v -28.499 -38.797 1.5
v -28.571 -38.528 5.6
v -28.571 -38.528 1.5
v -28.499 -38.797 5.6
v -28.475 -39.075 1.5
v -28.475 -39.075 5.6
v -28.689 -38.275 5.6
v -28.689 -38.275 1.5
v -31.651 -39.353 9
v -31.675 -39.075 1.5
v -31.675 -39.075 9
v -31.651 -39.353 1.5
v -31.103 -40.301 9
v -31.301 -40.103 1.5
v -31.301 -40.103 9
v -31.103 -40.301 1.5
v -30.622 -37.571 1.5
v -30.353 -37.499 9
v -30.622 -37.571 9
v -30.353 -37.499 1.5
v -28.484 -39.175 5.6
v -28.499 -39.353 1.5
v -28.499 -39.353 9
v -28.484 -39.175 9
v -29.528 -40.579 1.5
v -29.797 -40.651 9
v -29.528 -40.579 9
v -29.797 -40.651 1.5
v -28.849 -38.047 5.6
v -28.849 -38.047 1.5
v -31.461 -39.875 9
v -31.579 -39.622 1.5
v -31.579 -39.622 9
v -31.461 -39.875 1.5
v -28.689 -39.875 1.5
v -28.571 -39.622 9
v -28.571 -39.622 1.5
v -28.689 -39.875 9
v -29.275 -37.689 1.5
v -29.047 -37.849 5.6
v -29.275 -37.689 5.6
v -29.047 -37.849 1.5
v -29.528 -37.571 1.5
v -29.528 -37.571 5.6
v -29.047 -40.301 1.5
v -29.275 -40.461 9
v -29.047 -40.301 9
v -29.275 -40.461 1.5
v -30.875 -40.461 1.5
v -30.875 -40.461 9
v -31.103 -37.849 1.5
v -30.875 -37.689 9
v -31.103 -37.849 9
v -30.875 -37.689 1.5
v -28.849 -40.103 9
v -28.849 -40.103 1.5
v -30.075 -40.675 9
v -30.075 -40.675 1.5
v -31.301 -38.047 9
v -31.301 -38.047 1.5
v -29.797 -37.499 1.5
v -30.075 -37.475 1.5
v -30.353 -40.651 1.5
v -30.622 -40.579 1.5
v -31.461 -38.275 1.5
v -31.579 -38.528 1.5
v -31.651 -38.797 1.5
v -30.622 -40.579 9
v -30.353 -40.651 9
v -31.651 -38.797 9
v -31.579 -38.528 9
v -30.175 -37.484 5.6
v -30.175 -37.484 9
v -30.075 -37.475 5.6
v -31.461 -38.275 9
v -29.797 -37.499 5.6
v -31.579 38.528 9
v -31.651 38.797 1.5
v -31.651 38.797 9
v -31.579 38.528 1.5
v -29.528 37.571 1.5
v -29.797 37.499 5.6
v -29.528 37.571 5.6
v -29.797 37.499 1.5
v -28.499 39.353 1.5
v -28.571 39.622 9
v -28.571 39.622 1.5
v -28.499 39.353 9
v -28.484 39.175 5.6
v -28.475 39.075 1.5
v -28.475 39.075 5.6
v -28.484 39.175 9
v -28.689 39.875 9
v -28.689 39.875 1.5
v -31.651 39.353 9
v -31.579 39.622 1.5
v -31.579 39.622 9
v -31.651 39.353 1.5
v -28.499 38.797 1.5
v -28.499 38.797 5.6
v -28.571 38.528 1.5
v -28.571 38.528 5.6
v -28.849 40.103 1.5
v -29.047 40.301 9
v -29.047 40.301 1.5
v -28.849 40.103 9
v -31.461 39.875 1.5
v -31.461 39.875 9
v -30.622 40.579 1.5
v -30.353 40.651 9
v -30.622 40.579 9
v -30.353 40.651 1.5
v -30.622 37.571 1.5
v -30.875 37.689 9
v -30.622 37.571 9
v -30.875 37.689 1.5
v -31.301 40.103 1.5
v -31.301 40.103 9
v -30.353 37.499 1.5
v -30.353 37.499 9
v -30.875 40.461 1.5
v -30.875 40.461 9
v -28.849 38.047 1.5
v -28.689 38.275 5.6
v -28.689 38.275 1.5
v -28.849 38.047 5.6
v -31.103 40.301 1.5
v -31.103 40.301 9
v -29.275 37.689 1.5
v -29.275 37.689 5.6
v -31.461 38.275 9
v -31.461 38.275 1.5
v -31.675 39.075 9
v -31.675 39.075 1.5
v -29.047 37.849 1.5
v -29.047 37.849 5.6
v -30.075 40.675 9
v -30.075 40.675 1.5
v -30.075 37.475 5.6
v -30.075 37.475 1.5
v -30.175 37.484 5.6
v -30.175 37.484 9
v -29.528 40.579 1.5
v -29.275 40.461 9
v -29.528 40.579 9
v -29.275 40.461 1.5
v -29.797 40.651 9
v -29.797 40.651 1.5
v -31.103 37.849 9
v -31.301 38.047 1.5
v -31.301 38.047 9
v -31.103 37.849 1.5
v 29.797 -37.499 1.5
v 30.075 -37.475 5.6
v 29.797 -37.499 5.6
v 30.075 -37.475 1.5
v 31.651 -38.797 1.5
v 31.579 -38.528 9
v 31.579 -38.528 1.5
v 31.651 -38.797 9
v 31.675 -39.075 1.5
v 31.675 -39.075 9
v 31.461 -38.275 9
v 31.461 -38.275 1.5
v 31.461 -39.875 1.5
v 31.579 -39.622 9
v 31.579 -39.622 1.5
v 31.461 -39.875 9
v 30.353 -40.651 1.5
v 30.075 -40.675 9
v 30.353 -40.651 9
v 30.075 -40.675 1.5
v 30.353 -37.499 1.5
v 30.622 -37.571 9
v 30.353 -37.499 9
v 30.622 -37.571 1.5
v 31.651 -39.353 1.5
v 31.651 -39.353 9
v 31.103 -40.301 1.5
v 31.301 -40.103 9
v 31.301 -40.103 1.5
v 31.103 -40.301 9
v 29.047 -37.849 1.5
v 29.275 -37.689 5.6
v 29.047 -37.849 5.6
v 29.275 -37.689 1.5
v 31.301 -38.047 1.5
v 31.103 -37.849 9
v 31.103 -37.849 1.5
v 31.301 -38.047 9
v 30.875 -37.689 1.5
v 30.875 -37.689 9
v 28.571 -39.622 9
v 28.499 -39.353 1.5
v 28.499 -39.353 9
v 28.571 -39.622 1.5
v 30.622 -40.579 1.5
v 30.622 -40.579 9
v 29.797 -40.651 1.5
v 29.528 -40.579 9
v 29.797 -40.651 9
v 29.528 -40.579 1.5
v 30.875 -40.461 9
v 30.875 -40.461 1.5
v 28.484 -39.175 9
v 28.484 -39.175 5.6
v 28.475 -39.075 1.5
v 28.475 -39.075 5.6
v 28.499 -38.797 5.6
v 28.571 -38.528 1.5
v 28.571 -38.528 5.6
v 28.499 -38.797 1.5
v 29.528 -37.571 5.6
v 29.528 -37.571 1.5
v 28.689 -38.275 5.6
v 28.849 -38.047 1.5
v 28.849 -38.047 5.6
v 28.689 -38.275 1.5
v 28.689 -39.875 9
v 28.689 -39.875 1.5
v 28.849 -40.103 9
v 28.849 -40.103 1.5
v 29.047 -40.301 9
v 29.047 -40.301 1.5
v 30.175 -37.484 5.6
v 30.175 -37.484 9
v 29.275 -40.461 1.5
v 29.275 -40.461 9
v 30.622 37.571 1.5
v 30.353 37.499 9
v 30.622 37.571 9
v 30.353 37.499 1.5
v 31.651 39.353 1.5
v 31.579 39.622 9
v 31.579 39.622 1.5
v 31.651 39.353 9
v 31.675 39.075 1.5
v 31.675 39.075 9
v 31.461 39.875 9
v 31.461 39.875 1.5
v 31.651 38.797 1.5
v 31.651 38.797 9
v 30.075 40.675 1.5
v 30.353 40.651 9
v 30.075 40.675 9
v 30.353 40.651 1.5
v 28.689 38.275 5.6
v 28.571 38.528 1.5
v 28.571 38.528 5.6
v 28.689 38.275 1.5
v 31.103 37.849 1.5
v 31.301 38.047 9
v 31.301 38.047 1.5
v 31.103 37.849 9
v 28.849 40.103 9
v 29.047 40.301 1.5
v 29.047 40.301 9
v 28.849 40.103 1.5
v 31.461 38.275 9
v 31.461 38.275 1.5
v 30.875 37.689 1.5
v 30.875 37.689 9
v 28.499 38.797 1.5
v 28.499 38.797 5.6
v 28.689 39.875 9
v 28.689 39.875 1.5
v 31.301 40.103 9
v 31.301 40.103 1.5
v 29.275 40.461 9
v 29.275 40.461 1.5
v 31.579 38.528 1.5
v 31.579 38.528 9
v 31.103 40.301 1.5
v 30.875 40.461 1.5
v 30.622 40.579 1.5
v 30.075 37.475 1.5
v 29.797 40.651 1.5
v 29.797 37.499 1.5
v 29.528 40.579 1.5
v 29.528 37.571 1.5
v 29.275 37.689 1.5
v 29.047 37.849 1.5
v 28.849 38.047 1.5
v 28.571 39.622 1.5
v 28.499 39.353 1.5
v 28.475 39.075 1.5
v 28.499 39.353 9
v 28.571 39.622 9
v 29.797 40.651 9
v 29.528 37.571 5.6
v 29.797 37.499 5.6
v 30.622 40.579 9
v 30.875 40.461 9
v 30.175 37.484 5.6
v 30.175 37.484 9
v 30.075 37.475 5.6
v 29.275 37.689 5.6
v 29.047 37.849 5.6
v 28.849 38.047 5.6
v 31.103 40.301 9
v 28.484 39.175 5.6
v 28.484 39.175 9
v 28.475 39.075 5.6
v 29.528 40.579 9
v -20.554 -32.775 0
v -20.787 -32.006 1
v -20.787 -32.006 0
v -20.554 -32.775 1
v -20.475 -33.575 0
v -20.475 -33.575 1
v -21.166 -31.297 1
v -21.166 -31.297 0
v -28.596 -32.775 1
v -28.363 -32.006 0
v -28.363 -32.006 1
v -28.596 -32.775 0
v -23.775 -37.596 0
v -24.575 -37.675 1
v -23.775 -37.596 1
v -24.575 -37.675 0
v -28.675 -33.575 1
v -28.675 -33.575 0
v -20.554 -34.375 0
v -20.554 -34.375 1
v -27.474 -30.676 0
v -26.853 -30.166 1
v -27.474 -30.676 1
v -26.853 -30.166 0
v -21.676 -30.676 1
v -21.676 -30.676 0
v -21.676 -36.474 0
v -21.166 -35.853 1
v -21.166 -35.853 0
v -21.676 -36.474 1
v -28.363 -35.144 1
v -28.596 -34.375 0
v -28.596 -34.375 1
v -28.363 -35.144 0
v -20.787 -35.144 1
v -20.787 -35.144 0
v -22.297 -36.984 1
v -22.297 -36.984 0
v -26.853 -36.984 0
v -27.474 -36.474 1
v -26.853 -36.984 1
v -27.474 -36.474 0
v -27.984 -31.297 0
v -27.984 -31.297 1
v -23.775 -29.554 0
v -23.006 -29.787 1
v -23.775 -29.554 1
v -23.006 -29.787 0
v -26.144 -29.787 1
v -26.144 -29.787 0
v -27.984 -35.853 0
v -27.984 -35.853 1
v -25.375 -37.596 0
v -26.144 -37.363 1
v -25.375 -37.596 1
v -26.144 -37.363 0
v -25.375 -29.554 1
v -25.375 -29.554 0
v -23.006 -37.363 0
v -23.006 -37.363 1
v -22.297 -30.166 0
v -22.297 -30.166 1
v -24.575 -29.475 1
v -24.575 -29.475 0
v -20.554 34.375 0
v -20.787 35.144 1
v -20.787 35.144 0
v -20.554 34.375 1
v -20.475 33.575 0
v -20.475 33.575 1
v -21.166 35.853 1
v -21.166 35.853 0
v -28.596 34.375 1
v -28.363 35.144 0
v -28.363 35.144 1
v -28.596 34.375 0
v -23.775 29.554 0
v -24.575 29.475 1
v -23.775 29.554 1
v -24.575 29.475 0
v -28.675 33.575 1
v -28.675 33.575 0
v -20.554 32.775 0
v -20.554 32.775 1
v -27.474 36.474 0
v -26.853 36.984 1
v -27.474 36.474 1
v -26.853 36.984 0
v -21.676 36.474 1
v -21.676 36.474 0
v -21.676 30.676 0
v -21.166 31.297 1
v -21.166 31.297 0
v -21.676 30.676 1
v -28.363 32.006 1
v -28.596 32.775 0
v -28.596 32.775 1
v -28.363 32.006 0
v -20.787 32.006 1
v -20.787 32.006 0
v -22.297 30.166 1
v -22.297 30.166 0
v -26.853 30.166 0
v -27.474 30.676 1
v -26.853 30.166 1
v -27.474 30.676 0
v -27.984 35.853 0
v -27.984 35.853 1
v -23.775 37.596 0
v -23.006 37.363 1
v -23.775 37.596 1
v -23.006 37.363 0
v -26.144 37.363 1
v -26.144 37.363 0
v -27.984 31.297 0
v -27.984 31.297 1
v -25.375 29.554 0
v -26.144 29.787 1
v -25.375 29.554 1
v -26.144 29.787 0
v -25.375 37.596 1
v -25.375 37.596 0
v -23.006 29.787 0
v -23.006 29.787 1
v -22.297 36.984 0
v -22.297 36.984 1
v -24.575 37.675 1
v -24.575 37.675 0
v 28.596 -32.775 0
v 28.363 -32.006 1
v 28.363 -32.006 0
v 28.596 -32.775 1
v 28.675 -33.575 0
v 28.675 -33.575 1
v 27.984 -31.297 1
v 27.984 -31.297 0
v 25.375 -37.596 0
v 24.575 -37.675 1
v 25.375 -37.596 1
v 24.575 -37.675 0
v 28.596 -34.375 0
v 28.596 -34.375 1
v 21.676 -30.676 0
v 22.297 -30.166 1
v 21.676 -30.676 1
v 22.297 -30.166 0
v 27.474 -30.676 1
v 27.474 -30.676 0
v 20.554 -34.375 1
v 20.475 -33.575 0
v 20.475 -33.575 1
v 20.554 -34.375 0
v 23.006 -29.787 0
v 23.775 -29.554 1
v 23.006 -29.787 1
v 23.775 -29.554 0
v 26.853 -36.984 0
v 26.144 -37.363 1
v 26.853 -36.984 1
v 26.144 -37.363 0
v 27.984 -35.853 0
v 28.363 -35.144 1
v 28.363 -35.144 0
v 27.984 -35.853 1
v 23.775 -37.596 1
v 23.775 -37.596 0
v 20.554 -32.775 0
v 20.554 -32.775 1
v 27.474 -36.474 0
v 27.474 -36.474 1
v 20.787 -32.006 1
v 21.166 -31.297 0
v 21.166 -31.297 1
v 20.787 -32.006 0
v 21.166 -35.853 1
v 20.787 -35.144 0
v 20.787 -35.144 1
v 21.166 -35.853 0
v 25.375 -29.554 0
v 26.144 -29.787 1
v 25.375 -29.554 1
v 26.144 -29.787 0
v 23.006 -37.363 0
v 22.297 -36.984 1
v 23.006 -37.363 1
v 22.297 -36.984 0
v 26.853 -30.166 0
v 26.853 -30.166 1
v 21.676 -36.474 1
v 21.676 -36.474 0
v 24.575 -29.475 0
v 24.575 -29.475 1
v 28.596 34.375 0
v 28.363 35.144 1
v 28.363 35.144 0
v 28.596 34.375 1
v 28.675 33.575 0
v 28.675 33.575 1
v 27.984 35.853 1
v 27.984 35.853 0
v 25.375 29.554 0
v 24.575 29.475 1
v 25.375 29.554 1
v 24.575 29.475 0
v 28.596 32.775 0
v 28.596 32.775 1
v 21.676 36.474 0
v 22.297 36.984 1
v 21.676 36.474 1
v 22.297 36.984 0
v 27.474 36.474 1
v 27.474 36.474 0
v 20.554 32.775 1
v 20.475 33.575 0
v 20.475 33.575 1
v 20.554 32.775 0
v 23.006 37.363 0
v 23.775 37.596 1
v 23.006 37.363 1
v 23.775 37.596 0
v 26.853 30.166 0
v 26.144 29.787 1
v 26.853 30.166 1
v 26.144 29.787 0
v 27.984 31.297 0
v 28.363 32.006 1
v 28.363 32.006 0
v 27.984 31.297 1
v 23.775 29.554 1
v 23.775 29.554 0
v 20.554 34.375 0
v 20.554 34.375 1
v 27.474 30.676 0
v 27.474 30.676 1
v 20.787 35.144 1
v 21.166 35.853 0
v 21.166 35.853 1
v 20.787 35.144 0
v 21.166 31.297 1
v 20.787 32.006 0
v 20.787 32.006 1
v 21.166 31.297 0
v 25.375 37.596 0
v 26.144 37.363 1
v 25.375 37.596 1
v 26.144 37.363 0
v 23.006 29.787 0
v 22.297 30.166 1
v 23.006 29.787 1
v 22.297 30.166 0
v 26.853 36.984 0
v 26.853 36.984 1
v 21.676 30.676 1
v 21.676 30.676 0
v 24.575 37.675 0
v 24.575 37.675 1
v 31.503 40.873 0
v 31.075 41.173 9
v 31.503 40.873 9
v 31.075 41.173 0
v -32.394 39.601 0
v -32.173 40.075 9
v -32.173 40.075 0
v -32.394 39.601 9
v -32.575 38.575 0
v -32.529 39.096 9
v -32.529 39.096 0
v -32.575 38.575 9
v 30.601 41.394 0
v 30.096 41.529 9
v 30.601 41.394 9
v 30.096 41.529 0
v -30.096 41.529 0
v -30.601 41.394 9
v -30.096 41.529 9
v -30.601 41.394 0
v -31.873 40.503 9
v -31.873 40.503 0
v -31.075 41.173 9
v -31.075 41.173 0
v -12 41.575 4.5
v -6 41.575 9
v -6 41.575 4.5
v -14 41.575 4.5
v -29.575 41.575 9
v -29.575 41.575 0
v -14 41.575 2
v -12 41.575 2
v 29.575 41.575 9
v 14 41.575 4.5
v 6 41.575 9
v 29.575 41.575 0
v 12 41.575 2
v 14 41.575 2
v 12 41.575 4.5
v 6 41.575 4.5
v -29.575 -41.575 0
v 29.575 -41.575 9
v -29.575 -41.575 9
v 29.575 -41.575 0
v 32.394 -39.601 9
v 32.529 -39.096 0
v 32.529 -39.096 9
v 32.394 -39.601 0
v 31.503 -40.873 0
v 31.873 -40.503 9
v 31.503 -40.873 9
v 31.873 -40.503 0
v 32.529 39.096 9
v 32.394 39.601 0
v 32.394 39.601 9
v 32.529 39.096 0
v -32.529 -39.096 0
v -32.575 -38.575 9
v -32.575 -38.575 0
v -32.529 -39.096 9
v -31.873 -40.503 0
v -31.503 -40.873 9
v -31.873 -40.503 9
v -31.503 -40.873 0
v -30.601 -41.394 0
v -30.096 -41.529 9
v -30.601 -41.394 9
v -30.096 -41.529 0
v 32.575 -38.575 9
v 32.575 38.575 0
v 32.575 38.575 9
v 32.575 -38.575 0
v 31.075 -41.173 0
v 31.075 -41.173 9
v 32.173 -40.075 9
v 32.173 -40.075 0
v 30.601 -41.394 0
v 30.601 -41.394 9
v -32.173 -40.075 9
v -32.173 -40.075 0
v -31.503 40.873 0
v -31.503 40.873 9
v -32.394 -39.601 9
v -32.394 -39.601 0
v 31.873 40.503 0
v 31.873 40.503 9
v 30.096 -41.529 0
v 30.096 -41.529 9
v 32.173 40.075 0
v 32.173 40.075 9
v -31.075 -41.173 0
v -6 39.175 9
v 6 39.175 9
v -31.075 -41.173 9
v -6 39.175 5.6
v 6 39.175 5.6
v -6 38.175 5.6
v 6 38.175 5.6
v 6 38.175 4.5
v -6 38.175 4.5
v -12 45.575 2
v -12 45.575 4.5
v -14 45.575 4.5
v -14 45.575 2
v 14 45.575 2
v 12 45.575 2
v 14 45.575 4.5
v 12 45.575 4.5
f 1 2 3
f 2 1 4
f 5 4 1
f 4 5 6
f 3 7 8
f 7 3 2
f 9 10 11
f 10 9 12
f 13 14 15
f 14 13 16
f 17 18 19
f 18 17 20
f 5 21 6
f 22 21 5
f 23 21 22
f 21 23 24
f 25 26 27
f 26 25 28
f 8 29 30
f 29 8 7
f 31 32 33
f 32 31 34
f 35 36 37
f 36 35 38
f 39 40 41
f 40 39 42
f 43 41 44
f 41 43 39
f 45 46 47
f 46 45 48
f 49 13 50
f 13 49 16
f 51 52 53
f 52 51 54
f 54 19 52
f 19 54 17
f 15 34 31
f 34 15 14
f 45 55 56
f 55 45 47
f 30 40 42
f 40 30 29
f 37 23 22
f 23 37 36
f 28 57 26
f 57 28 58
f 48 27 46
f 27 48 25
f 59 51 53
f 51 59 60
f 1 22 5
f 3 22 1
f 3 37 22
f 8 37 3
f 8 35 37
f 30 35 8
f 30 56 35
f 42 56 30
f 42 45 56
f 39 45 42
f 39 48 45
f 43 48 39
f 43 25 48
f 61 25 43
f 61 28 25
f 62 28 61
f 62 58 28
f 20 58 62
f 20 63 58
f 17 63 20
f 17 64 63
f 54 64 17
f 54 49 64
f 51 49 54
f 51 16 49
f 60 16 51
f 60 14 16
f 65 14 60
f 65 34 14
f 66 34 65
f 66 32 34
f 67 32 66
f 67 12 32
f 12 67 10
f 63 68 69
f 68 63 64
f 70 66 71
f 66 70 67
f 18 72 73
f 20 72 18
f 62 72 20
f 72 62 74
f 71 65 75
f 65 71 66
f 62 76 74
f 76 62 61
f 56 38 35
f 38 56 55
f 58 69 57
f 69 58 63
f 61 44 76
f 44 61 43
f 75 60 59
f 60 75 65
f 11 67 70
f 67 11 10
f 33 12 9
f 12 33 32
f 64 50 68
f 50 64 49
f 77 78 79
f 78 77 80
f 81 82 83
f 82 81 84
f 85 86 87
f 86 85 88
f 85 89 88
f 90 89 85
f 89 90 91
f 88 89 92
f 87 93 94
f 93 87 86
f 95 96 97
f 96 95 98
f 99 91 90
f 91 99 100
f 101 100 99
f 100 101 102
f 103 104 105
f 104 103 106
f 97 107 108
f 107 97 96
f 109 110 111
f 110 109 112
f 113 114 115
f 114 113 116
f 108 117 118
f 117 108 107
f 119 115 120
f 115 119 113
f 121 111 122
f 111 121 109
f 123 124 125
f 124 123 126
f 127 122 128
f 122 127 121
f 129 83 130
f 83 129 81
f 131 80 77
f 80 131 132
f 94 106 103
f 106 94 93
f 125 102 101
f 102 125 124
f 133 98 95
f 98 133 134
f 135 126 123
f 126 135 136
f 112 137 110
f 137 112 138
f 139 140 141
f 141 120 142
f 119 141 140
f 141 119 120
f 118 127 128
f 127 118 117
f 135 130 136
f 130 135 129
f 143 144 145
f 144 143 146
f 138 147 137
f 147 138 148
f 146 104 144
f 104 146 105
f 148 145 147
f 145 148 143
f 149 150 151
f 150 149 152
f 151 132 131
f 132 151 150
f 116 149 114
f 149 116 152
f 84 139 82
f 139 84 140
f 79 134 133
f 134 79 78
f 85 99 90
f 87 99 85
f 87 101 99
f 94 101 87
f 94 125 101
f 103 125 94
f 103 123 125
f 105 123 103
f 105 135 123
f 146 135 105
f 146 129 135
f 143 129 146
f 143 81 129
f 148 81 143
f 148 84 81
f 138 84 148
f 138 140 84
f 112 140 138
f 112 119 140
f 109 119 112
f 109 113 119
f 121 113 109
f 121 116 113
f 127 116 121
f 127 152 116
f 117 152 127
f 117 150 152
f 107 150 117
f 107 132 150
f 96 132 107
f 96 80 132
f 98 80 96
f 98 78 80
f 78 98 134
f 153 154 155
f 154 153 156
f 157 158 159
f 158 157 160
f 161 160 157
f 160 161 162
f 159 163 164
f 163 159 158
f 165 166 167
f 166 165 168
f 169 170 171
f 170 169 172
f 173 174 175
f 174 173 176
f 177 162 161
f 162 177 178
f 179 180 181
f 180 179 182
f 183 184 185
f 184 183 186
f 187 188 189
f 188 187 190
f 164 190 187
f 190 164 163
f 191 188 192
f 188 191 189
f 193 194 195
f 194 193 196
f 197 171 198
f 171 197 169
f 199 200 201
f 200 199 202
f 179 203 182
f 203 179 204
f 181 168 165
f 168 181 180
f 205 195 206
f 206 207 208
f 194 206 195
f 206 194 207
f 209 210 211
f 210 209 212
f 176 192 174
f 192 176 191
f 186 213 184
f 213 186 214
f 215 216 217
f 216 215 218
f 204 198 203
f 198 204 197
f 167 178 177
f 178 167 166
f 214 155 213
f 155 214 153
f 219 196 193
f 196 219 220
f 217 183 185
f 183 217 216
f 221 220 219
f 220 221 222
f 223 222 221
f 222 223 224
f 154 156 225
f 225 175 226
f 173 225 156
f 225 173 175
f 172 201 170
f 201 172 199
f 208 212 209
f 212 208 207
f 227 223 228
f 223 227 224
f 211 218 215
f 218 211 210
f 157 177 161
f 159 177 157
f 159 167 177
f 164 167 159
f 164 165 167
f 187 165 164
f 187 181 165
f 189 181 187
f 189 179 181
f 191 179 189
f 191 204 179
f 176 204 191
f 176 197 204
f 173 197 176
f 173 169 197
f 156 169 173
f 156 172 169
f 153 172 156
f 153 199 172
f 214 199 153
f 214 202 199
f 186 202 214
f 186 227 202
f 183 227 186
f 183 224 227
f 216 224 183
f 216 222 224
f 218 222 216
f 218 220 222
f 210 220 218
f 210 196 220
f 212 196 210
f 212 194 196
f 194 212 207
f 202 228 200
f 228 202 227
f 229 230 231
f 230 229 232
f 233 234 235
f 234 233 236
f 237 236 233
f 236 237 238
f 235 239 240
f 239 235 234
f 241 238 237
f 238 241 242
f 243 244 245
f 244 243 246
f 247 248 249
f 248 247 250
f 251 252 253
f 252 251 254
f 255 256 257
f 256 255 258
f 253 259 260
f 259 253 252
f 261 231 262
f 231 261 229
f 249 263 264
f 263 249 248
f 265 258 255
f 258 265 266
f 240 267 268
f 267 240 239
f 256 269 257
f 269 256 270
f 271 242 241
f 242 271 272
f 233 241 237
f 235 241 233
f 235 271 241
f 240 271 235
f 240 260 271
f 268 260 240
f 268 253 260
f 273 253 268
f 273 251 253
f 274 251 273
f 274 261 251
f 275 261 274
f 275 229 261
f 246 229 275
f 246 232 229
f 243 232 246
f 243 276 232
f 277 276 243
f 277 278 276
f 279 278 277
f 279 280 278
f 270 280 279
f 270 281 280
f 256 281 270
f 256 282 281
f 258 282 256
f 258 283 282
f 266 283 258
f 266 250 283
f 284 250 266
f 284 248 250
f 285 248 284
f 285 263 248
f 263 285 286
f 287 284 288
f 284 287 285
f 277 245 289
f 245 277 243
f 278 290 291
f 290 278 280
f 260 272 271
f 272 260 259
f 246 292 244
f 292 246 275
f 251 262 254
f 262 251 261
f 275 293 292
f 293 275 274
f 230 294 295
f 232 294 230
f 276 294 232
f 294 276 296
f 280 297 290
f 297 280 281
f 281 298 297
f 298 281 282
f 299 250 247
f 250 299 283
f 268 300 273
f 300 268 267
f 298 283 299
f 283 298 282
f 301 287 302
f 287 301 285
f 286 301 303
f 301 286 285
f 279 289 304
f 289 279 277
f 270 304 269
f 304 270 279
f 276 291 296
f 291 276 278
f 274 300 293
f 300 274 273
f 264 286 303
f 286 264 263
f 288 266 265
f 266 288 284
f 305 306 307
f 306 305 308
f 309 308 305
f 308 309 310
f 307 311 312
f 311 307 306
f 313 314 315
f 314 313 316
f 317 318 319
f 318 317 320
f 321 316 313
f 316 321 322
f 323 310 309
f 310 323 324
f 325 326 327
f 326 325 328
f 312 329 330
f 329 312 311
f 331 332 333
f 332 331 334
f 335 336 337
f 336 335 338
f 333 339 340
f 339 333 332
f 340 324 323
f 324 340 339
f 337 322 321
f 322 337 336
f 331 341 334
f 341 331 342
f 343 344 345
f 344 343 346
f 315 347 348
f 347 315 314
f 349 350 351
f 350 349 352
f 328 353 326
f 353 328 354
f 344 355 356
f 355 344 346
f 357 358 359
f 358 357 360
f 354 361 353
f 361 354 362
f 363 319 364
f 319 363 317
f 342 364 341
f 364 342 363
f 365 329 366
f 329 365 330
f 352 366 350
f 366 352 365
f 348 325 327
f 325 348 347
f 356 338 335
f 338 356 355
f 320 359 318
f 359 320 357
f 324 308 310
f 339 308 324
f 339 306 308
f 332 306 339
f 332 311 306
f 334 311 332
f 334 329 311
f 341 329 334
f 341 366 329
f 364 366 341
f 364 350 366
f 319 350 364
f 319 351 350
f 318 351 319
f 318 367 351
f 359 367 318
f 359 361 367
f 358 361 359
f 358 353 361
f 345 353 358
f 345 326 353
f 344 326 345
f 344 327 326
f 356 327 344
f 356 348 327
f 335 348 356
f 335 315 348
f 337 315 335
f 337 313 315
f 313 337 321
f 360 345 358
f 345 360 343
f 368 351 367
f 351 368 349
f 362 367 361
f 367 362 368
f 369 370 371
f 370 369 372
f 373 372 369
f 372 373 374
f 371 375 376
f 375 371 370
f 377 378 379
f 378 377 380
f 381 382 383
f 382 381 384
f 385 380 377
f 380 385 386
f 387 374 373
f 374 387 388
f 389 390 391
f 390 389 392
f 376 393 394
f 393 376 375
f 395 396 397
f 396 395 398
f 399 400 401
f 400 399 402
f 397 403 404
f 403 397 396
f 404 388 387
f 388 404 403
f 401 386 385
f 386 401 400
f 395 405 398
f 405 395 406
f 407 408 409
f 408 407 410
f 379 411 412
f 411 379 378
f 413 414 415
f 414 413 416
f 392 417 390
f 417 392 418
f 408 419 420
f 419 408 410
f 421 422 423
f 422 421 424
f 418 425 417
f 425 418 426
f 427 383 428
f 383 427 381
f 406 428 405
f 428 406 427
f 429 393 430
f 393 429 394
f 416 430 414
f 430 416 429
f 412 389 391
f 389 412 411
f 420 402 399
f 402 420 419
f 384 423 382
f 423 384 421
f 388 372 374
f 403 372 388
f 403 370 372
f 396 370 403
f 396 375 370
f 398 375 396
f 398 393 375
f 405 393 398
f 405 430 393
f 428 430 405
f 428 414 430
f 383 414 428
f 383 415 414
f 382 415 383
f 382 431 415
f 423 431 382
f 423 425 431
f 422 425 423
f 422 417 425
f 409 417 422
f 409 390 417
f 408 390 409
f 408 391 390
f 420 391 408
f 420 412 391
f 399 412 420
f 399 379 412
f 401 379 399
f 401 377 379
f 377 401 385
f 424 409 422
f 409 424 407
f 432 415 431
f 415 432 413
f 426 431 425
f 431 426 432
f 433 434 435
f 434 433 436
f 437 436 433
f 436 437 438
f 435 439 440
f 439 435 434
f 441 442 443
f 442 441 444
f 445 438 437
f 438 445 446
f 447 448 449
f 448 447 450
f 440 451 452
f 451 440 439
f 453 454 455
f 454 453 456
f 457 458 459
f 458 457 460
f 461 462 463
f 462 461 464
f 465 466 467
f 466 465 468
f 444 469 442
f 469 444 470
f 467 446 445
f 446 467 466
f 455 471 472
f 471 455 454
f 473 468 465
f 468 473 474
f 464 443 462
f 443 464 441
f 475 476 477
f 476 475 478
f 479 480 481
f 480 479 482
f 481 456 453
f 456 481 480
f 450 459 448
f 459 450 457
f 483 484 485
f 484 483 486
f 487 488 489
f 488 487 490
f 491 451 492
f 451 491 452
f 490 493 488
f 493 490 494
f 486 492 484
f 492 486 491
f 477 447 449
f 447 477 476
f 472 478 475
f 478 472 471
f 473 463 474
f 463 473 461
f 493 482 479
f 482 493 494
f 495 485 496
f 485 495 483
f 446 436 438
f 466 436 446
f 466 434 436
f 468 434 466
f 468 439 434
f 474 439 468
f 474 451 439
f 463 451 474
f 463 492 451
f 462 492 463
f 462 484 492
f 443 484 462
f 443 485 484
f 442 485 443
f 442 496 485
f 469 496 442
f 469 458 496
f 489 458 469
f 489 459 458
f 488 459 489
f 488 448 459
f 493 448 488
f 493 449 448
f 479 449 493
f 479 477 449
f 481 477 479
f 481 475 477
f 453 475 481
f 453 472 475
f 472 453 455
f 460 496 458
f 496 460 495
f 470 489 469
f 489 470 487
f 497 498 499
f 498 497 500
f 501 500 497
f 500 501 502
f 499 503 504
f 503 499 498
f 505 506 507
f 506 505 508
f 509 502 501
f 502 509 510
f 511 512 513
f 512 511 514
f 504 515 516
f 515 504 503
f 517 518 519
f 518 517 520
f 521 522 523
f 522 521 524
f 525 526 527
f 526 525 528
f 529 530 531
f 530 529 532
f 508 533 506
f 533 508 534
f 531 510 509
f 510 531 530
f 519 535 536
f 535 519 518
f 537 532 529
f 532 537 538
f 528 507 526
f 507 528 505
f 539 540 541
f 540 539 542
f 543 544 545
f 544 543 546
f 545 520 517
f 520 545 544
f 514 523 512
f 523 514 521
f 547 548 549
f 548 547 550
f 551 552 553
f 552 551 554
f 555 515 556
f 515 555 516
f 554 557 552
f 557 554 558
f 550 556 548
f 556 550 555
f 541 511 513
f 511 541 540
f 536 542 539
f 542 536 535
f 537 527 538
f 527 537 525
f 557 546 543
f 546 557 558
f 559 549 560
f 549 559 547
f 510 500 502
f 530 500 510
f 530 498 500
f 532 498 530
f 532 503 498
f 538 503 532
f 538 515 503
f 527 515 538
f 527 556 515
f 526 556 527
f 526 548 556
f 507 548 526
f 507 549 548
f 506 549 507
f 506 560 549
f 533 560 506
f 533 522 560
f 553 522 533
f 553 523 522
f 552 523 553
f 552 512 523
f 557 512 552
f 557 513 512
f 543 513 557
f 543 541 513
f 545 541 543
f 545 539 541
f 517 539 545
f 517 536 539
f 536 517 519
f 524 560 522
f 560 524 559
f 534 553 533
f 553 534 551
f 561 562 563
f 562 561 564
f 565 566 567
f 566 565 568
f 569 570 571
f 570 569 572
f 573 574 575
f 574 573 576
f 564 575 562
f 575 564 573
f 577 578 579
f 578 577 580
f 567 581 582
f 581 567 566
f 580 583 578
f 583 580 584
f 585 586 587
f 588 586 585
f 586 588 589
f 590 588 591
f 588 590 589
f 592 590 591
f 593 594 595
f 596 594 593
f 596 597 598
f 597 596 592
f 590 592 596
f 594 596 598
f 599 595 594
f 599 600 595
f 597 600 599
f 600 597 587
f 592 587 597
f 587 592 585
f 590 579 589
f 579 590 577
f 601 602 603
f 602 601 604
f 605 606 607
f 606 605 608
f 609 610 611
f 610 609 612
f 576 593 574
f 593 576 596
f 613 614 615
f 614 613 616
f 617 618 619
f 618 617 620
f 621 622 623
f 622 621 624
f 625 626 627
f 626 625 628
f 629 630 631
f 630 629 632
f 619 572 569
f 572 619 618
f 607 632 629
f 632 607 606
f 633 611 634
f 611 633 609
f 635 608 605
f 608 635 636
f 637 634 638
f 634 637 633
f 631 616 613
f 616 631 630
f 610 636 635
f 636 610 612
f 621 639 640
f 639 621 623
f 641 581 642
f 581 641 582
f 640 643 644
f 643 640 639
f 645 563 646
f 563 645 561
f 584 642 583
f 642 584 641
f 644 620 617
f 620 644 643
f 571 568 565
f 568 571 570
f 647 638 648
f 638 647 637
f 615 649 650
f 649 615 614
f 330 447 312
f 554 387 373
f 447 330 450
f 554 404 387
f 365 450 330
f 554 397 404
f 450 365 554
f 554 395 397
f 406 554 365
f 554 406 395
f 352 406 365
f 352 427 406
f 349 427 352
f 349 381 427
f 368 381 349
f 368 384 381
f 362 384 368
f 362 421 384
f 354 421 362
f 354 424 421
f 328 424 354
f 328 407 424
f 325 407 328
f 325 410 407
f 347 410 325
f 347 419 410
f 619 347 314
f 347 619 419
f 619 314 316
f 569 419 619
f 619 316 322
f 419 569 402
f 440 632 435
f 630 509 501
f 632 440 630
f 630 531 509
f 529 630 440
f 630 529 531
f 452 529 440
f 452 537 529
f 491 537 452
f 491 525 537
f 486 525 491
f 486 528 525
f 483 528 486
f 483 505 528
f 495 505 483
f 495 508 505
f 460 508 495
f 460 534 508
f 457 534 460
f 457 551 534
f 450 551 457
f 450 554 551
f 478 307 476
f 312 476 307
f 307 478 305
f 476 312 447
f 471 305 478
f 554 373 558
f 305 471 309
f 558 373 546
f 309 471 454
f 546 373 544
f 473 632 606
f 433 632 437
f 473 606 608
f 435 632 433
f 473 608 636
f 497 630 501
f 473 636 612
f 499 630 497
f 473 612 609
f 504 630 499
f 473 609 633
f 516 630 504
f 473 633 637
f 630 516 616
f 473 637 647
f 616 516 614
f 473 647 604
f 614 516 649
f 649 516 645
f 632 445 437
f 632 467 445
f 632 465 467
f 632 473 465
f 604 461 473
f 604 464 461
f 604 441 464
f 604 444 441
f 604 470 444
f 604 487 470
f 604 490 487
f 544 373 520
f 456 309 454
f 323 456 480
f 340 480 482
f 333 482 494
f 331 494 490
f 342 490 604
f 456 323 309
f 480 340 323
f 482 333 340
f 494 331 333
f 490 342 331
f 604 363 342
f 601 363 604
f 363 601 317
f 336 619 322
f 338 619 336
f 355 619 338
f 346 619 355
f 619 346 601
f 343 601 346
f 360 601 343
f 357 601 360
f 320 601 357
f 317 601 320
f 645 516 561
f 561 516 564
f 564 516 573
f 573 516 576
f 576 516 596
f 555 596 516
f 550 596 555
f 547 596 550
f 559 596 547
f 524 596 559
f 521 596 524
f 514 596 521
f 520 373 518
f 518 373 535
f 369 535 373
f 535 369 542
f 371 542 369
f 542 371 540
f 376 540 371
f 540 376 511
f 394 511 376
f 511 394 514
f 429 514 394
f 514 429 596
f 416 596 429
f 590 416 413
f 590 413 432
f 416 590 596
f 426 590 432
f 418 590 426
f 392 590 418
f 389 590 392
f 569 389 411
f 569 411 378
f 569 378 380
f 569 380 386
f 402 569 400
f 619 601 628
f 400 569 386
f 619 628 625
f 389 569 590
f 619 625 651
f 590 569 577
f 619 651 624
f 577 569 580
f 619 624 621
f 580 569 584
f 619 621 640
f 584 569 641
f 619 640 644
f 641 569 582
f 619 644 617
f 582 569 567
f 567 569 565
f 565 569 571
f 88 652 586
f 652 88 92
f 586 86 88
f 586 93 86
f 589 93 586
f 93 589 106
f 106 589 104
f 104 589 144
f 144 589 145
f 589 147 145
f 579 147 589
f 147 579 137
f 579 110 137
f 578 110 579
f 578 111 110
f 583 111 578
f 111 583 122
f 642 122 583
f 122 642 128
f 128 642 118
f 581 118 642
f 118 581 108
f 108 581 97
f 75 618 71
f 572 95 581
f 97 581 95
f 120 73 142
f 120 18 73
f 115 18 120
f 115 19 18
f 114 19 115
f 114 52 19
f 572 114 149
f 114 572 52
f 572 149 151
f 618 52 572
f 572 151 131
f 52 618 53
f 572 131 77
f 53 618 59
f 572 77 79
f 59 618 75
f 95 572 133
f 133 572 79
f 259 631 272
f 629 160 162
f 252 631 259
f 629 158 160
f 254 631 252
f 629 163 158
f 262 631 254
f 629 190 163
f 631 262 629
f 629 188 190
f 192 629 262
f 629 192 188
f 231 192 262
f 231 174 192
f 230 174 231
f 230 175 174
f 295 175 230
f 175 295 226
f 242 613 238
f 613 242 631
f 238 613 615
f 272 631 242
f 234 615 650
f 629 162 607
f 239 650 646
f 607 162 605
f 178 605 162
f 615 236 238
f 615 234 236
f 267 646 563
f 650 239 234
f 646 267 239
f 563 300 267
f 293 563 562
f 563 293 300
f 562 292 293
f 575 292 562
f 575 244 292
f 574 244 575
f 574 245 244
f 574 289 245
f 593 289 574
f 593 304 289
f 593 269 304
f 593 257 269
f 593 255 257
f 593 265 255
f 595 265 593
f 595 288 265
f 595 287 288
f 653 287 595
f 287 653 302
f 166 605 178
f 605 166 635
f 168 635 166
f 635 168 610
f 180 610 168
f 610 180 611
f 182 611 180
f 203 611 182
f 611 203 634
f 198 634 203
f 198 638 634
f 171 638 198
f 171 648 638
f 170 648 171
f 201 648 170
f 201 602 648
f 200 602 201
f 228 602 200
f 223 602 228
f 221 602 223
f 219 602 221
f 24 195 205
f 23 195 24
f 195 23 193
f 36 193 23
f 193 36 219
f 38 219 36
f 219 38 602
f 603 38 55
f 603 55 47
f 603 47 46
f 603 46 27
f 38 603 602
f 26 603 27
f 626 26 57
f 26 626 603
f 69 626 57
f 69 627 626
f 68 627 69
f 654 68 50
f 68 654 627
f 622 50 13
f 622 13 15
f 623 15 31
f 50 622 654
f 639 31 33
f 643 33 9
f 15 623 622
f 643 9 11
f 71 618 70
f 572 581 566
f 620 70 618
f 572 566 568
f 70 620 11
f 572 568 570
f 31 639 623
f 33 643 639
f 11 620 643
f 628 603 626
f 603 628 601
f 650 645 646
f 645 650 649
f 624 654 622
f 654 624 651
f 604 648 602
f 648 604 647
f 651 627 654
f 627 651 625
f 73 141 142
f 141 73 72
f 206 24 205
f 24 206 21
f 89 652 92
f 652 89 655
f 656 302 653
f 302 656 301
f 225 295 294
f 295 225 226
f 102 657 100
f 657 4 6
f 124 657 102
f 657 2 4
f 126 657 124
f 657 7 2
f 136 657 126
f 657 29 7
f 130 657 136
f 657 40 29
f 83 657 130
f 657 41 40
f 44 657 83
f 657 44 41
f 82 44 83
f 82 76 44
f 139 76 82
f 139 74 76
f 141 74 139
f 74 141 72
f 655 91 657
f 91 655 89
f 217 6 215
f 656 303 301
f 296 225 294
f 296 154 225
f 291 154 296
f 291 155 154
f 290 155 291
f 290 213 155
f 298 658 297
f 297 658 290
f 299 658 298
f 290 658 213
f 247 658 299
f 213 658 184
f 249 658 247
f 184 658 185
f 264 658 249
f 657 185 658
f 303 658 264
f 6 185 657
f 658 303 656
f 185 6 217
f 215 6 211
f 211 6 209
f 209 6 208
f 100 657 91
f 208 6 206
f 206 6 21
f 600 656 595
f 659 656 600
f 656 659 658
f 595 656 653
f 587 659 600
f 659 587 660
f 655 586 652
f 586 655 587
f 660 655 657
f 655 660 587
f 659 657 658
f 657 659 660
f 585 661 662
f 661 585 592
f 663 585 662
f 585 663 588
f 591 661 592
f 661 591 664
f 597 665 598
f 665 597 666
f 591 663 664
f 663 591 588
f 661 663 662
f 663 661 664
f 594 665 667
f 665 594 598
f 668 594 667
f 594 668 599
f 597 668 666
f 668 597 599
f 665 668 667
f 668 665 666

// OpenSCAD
// ==============================================================================
// PARAMETRIC MACROPAD BOTTOM PLATE / CASE TRAY
// ==============================================================================
// Features:
//  - Dedicated mounting options for common microcontrollers (ESP32, RP2040, Pro Micro, Pico)
//  - Specifically optimized for ESP32 DevKit / S2-S3 Mini / XIAO ESP32
//  - Deep wiring cavity so underside wires never get crushed or pinched
//  - USB port pass-through cutout matched to MCU height
//  - 4x Recessed rubber foot pockets (for 8mm silicone anti-slip pads)
//  - Corner M2 mounting holes (supports M2 heat-set inserts or direct screws)
// ==============================================================================

// ------------------------------------------------------------------------------
// PARAMETRIC CONFIGURATION
// ------------------------------------------------------------------------------
/* [Microcontroller Selection] */
// Choose your microcontroller board:
// "esp32_devkit"  : Standard ESP32 NodeMCU / DevKit V1 (30/38 pin)
// "esp32_s2_mini" : Lolin / Wemos ESP32-S2 / S3 Mini (USB-C)
// "esp32_c3_xiao" : Seeed Studio XIAO ESP32-C3 / S3 (Ultra compact)
// "rp2040_zero"   : Waveshare RP2040-Zero (USB-C)
// "pro_micro"     : Standard Pro Micro (ATmega32U4 / RP2040)
// "pi_pico"       : Raspberry Pi Pico / Pico W
// "universal"     : Open pocket for any custom MCU or battery
mcu_type = "esp32_devkit"; // [esp32_devkit, esp32_s2_mini, esp32_c3_xiao, rp2040_zero, pro_micro, pi_pico, universal]

/* [Grid Dimensions (Must match midplate)] */
rows = 3;
cols = 3;
pitch = 19.05;

border_margin_x = 4.0;
border_margin_bottom = 4.0;
mcu_dock_depth = 22.0; 
corner_r = 3.0;

/* [Enclosure Case Dimensions] */
// Total outer height of bottom tray
case_height = 9.0;
// Internal floor thickness
floor_thickness = 2.0;
// Perimeter wall thickness
wall_thickness = 2.4;

// Ergonomic tilt angle (0 for flat desk profile, 5 to 7 degrees for tilt)
tilt_angle = 0; // [0:15]

/* [Mounting & Hardware] */
// Corner screw type: "heatset_insert" (M2 brass threaded insert, 3.2mm) or "through_screw" (2.2mm)
insert_type = "heatset_insert"; // [heatset_insert, through_screw]
mount_hole_inset = 2.5;

// Anti-slip rubber foot pockets on underside (8mm round silicone pads)
include_rubber_feet = true;
foot_diameter = 8.2;
foot_depth = 1.0;

$fn = 36;

// ------------------------------------------------------------------------------
// MAIN RENDER
// ------------------------------------------------------------------------------
macropad_bottom_plate(
    mcu_type = mcu_type,
    rows = rows,
    cols = cols,
    pitch = pitch,
    case_height = case_height,
    floor_thickness = floor_thickness,
    wall_thickness = wall_thickness,
    border_margin_x = border_margin_x,
    border_margin_bottom = border_margin_bottom,
    mcu_dock_depth = mcu_dock_depth,
    corner_r = corner_r,
    insert_type = insert_type,
    include_rubber_feet = include_rubber_feet
);

// ==============================================================================
// MODULE: MACROPAD BOTTOM PLATE
// ==============================================================================
module macropad_bottom_plate(
    mcu_type = "esp32_devkit",
    rows = 3,
    cols = 3,
    pitch = 19.05,
    case_height = 9.0,
    floor_thickness = 2.0,
    wall_thickness = 2.4,
    border_margin_x = 4.0,
    border_margin_bottom = 4.0,
    mcu_dock_depth = 22.0,
    corner_r = 3.0,
    insert_type = "heatset_insert",
    include_rubber_feet = true
) {
    total_w = (cols * pitch) + (border_margin_x * 2);
    grid_l  = (rows * pitch);
    total_l = grid_l + border_margin_bottom + mcu_dock_depth;

    internal_w = total_w - (wall_thickness * 2);
    internal_l = total_l - (wall_thickness * 2);
    cavity_depth = case_height - floor_thickness;

    dock_center_y = (total_l / 2) - (mcu_dock_depth / 2);

    hole_d = (insert_type == "heatset_insert") ? 3.2 : 2.2; // 3.2mm for M2 brass heatset insert

    difference() {
        // --- 1. Outer Solid Base Tray ---
        bottom_hull_box(total_w, total_l, case_height, r=corner_r);

        // --- 2. Main Internal Wiring & Component Cavity ---
        translate([0, 0, floor_thickness + cavity_depth/2 + 0.1])
            bottom_hull_box(internal_w, internal_l, cavity_depth + 0.2, r=max(0.5, corner_r - wall_thickness));

        // --- 3. Corner Mounting Screw / Heatset Insert Holes ---
        corner_x = (total_w / 2) - mount_hole_inset;
        corner_y = (total_l / 2) - mount_hole_inset;
        for (mx = [-corner_x, corner_x]) {
            for (my = [-corner_y, corner_y]) {
                // Hole extending from top of case down
                translate([mx, my, floor_thickness - 0.5])
                    cylinder(d=hole_d, h=case_height + 2);
            }
        }

        // --- 4. USB Port Cutout on Top/Back Wall ---
        mcu_usb_spec = get_mcu_usb_spec(mcu_type);
        usb_w = mcu_usb_spec[0];
        usb_h = mcu_usb_spec[1];
        usb_z_offset = mcu_usb_spec[2];

        translate([0, total_l/2 - wall_thickness/2, floor_thickness + usb_z_offset + usb_h/2])
            cube([usb_w, wall_thickness + 2, usb_h], center=true);

        // --- 5. Rubber Anti-Slip Foot Recesses (Underside) ---
        if (include_rubber_feet) {
            foot_x = (total_w / 2) - 8.0;
            foot_y = (total_l / 2) - 8.0;
            for (fx = [-foot_x, foot_x]) {
                for (fy = [-foot_y, foot_y]) {
                    translate([fx, fy, -0.1])
                        cylinder(d=foot_diameter, h=foot_depth + 0.1, $fn=32);
                }
            }
        }
    }

    // --- 6. ADDITIVE MCU CRADLE & STANDOFF SUPPORTS ---
    translate([0, dock_center_y, 0]) {
        render_mcu_cradle(mcu_type, floor_thickness, cavity_depth);
    }
}

// ------------------------------------------------------------------------------
// MCU SPECIFICATIONS & STANDOFF GENERATOR
// ------------------------------------------------------------------------------
// Returns [usb_width, usb_height, usb_z_offset_from_floor]
function get_mcu_usb_spec(type) =
    (type == "esp32_devkit")  ? [12.0, 7.0, 2.5] : // ESP32 DevKit USB-C / micro
    (type == "esp32_s2_mini") ? [11.5, 6.5, 2.2] : // ESP32-S2 Mini USB-C
    (type == "esp32_c3_xiao") ? [11.0, 6.0, 1.8] : // Seeed Xiao USB-C
    (type == "rp2040_zero")   ? [11.0, 6.0, 1.8] : // RP2040-Zero USB-C
    (type == "pro_micro")     ? [10.5, 6.0, 2.0] : // Pro Micro USB
    (type == "pi_pico")       ? [11.5, 6.5, 2.2] : // Pi Pico USB
    [12.0, 7.0, 2.5]; // Universal

module render_mcu_cradle(type, floor_h, cav_depth) {
    if (type == "esp32_devkit") {
        // Standard ESP32 DevKit V1 Cradle (Width 25.4 - 26.0mm, Length 48.0 - 52.0mm)
        // Standoff support rails on sides
        standoff_h = 2.5;
        translate([-13.0, 0, floor_h + standoff_h/2])
            cube([2.0, 30.0, standoff_h], center=true);
        translate([ 13.0, 0, floor_h + standoff_h/2])
            cube([2.0, 30.0, standoff_h], center=true);
        // Small retention edge stops
        translate([0, -15.5, floor_h + 1.2])
            cube([24.0, 1.5, 2.4], center=true);
    } else if (type == "esp32_s2_mini") {
        // Wemos / Lolin S2-S3 Mini (Width 25.4mm, Length 34.3mm)
        standoff_h = 2.2;
        translate([-12.7, 0, floor_h + standoff_h/2]) cube([2.0, 22.0, standoff_h], center=true);
        translate([ 12.7, 0, floor_h + standoff_h/2]) cube([2.0, 22.0, standoff_h], center=true);
    } else if (type == "esp32_c3_xiao") {
        // Seeed Studio XIAO (21.0 x 17.5mm)
        standoff_h = 1.8;
        translate([-8.8, 0, floor_h + standoff_h/2]) cube([1.8, 14.0, standoff_h], center=true);
        translate([ 8.8, 0, floor_h + standoff_h/2]) cube([1.8, 14.0, standoff_h], center=true);
    } else if (type == "rp2040_zero") {
        // Waveshare RP2040-Zero (18.0 x 23.5mm)
        standoff_h = 1.8;
        translate([-9.0, 0, floor_h + standoff_h/2]) cube([1.8, 16.0, standoff_h], center=true);
        translate([ 9.0, 0, floor_h + standoff_h/2]) cube([1.8, 16.0, standoff_h], center=true);
    } else if (type == "pro_micro") {
        // Pro Micro (18.0 x 33.0mm)
        standoff_h = 2.0;
        translate([-9.0, 0, floor_h + standoff_h/2]) cube([1.8, 24.0, standoff_h], center=true);
        translate([ 9.0, 0, floor_h + standoff_h/2]) cube([1.8, 24.0, standoff_h], center=true);
    }
}

module bottom_hull_box(w, l, h, r=3.0) {
    hull() {
        translate([-w/2 + r, -l/2 + r, 0]) cylinder(r=r, h=h);
        translate([ w/2 - r, -l/2 + r, 0]) cylinder(r=r, h=h);
        translate([ w/2 - r,  l/2 - r, 0]) cylinder(r=r, h=h);
        translate([-w/2 + r,  l/2 - r, 0]) cylinder(r=r, h=h);
    }
}
